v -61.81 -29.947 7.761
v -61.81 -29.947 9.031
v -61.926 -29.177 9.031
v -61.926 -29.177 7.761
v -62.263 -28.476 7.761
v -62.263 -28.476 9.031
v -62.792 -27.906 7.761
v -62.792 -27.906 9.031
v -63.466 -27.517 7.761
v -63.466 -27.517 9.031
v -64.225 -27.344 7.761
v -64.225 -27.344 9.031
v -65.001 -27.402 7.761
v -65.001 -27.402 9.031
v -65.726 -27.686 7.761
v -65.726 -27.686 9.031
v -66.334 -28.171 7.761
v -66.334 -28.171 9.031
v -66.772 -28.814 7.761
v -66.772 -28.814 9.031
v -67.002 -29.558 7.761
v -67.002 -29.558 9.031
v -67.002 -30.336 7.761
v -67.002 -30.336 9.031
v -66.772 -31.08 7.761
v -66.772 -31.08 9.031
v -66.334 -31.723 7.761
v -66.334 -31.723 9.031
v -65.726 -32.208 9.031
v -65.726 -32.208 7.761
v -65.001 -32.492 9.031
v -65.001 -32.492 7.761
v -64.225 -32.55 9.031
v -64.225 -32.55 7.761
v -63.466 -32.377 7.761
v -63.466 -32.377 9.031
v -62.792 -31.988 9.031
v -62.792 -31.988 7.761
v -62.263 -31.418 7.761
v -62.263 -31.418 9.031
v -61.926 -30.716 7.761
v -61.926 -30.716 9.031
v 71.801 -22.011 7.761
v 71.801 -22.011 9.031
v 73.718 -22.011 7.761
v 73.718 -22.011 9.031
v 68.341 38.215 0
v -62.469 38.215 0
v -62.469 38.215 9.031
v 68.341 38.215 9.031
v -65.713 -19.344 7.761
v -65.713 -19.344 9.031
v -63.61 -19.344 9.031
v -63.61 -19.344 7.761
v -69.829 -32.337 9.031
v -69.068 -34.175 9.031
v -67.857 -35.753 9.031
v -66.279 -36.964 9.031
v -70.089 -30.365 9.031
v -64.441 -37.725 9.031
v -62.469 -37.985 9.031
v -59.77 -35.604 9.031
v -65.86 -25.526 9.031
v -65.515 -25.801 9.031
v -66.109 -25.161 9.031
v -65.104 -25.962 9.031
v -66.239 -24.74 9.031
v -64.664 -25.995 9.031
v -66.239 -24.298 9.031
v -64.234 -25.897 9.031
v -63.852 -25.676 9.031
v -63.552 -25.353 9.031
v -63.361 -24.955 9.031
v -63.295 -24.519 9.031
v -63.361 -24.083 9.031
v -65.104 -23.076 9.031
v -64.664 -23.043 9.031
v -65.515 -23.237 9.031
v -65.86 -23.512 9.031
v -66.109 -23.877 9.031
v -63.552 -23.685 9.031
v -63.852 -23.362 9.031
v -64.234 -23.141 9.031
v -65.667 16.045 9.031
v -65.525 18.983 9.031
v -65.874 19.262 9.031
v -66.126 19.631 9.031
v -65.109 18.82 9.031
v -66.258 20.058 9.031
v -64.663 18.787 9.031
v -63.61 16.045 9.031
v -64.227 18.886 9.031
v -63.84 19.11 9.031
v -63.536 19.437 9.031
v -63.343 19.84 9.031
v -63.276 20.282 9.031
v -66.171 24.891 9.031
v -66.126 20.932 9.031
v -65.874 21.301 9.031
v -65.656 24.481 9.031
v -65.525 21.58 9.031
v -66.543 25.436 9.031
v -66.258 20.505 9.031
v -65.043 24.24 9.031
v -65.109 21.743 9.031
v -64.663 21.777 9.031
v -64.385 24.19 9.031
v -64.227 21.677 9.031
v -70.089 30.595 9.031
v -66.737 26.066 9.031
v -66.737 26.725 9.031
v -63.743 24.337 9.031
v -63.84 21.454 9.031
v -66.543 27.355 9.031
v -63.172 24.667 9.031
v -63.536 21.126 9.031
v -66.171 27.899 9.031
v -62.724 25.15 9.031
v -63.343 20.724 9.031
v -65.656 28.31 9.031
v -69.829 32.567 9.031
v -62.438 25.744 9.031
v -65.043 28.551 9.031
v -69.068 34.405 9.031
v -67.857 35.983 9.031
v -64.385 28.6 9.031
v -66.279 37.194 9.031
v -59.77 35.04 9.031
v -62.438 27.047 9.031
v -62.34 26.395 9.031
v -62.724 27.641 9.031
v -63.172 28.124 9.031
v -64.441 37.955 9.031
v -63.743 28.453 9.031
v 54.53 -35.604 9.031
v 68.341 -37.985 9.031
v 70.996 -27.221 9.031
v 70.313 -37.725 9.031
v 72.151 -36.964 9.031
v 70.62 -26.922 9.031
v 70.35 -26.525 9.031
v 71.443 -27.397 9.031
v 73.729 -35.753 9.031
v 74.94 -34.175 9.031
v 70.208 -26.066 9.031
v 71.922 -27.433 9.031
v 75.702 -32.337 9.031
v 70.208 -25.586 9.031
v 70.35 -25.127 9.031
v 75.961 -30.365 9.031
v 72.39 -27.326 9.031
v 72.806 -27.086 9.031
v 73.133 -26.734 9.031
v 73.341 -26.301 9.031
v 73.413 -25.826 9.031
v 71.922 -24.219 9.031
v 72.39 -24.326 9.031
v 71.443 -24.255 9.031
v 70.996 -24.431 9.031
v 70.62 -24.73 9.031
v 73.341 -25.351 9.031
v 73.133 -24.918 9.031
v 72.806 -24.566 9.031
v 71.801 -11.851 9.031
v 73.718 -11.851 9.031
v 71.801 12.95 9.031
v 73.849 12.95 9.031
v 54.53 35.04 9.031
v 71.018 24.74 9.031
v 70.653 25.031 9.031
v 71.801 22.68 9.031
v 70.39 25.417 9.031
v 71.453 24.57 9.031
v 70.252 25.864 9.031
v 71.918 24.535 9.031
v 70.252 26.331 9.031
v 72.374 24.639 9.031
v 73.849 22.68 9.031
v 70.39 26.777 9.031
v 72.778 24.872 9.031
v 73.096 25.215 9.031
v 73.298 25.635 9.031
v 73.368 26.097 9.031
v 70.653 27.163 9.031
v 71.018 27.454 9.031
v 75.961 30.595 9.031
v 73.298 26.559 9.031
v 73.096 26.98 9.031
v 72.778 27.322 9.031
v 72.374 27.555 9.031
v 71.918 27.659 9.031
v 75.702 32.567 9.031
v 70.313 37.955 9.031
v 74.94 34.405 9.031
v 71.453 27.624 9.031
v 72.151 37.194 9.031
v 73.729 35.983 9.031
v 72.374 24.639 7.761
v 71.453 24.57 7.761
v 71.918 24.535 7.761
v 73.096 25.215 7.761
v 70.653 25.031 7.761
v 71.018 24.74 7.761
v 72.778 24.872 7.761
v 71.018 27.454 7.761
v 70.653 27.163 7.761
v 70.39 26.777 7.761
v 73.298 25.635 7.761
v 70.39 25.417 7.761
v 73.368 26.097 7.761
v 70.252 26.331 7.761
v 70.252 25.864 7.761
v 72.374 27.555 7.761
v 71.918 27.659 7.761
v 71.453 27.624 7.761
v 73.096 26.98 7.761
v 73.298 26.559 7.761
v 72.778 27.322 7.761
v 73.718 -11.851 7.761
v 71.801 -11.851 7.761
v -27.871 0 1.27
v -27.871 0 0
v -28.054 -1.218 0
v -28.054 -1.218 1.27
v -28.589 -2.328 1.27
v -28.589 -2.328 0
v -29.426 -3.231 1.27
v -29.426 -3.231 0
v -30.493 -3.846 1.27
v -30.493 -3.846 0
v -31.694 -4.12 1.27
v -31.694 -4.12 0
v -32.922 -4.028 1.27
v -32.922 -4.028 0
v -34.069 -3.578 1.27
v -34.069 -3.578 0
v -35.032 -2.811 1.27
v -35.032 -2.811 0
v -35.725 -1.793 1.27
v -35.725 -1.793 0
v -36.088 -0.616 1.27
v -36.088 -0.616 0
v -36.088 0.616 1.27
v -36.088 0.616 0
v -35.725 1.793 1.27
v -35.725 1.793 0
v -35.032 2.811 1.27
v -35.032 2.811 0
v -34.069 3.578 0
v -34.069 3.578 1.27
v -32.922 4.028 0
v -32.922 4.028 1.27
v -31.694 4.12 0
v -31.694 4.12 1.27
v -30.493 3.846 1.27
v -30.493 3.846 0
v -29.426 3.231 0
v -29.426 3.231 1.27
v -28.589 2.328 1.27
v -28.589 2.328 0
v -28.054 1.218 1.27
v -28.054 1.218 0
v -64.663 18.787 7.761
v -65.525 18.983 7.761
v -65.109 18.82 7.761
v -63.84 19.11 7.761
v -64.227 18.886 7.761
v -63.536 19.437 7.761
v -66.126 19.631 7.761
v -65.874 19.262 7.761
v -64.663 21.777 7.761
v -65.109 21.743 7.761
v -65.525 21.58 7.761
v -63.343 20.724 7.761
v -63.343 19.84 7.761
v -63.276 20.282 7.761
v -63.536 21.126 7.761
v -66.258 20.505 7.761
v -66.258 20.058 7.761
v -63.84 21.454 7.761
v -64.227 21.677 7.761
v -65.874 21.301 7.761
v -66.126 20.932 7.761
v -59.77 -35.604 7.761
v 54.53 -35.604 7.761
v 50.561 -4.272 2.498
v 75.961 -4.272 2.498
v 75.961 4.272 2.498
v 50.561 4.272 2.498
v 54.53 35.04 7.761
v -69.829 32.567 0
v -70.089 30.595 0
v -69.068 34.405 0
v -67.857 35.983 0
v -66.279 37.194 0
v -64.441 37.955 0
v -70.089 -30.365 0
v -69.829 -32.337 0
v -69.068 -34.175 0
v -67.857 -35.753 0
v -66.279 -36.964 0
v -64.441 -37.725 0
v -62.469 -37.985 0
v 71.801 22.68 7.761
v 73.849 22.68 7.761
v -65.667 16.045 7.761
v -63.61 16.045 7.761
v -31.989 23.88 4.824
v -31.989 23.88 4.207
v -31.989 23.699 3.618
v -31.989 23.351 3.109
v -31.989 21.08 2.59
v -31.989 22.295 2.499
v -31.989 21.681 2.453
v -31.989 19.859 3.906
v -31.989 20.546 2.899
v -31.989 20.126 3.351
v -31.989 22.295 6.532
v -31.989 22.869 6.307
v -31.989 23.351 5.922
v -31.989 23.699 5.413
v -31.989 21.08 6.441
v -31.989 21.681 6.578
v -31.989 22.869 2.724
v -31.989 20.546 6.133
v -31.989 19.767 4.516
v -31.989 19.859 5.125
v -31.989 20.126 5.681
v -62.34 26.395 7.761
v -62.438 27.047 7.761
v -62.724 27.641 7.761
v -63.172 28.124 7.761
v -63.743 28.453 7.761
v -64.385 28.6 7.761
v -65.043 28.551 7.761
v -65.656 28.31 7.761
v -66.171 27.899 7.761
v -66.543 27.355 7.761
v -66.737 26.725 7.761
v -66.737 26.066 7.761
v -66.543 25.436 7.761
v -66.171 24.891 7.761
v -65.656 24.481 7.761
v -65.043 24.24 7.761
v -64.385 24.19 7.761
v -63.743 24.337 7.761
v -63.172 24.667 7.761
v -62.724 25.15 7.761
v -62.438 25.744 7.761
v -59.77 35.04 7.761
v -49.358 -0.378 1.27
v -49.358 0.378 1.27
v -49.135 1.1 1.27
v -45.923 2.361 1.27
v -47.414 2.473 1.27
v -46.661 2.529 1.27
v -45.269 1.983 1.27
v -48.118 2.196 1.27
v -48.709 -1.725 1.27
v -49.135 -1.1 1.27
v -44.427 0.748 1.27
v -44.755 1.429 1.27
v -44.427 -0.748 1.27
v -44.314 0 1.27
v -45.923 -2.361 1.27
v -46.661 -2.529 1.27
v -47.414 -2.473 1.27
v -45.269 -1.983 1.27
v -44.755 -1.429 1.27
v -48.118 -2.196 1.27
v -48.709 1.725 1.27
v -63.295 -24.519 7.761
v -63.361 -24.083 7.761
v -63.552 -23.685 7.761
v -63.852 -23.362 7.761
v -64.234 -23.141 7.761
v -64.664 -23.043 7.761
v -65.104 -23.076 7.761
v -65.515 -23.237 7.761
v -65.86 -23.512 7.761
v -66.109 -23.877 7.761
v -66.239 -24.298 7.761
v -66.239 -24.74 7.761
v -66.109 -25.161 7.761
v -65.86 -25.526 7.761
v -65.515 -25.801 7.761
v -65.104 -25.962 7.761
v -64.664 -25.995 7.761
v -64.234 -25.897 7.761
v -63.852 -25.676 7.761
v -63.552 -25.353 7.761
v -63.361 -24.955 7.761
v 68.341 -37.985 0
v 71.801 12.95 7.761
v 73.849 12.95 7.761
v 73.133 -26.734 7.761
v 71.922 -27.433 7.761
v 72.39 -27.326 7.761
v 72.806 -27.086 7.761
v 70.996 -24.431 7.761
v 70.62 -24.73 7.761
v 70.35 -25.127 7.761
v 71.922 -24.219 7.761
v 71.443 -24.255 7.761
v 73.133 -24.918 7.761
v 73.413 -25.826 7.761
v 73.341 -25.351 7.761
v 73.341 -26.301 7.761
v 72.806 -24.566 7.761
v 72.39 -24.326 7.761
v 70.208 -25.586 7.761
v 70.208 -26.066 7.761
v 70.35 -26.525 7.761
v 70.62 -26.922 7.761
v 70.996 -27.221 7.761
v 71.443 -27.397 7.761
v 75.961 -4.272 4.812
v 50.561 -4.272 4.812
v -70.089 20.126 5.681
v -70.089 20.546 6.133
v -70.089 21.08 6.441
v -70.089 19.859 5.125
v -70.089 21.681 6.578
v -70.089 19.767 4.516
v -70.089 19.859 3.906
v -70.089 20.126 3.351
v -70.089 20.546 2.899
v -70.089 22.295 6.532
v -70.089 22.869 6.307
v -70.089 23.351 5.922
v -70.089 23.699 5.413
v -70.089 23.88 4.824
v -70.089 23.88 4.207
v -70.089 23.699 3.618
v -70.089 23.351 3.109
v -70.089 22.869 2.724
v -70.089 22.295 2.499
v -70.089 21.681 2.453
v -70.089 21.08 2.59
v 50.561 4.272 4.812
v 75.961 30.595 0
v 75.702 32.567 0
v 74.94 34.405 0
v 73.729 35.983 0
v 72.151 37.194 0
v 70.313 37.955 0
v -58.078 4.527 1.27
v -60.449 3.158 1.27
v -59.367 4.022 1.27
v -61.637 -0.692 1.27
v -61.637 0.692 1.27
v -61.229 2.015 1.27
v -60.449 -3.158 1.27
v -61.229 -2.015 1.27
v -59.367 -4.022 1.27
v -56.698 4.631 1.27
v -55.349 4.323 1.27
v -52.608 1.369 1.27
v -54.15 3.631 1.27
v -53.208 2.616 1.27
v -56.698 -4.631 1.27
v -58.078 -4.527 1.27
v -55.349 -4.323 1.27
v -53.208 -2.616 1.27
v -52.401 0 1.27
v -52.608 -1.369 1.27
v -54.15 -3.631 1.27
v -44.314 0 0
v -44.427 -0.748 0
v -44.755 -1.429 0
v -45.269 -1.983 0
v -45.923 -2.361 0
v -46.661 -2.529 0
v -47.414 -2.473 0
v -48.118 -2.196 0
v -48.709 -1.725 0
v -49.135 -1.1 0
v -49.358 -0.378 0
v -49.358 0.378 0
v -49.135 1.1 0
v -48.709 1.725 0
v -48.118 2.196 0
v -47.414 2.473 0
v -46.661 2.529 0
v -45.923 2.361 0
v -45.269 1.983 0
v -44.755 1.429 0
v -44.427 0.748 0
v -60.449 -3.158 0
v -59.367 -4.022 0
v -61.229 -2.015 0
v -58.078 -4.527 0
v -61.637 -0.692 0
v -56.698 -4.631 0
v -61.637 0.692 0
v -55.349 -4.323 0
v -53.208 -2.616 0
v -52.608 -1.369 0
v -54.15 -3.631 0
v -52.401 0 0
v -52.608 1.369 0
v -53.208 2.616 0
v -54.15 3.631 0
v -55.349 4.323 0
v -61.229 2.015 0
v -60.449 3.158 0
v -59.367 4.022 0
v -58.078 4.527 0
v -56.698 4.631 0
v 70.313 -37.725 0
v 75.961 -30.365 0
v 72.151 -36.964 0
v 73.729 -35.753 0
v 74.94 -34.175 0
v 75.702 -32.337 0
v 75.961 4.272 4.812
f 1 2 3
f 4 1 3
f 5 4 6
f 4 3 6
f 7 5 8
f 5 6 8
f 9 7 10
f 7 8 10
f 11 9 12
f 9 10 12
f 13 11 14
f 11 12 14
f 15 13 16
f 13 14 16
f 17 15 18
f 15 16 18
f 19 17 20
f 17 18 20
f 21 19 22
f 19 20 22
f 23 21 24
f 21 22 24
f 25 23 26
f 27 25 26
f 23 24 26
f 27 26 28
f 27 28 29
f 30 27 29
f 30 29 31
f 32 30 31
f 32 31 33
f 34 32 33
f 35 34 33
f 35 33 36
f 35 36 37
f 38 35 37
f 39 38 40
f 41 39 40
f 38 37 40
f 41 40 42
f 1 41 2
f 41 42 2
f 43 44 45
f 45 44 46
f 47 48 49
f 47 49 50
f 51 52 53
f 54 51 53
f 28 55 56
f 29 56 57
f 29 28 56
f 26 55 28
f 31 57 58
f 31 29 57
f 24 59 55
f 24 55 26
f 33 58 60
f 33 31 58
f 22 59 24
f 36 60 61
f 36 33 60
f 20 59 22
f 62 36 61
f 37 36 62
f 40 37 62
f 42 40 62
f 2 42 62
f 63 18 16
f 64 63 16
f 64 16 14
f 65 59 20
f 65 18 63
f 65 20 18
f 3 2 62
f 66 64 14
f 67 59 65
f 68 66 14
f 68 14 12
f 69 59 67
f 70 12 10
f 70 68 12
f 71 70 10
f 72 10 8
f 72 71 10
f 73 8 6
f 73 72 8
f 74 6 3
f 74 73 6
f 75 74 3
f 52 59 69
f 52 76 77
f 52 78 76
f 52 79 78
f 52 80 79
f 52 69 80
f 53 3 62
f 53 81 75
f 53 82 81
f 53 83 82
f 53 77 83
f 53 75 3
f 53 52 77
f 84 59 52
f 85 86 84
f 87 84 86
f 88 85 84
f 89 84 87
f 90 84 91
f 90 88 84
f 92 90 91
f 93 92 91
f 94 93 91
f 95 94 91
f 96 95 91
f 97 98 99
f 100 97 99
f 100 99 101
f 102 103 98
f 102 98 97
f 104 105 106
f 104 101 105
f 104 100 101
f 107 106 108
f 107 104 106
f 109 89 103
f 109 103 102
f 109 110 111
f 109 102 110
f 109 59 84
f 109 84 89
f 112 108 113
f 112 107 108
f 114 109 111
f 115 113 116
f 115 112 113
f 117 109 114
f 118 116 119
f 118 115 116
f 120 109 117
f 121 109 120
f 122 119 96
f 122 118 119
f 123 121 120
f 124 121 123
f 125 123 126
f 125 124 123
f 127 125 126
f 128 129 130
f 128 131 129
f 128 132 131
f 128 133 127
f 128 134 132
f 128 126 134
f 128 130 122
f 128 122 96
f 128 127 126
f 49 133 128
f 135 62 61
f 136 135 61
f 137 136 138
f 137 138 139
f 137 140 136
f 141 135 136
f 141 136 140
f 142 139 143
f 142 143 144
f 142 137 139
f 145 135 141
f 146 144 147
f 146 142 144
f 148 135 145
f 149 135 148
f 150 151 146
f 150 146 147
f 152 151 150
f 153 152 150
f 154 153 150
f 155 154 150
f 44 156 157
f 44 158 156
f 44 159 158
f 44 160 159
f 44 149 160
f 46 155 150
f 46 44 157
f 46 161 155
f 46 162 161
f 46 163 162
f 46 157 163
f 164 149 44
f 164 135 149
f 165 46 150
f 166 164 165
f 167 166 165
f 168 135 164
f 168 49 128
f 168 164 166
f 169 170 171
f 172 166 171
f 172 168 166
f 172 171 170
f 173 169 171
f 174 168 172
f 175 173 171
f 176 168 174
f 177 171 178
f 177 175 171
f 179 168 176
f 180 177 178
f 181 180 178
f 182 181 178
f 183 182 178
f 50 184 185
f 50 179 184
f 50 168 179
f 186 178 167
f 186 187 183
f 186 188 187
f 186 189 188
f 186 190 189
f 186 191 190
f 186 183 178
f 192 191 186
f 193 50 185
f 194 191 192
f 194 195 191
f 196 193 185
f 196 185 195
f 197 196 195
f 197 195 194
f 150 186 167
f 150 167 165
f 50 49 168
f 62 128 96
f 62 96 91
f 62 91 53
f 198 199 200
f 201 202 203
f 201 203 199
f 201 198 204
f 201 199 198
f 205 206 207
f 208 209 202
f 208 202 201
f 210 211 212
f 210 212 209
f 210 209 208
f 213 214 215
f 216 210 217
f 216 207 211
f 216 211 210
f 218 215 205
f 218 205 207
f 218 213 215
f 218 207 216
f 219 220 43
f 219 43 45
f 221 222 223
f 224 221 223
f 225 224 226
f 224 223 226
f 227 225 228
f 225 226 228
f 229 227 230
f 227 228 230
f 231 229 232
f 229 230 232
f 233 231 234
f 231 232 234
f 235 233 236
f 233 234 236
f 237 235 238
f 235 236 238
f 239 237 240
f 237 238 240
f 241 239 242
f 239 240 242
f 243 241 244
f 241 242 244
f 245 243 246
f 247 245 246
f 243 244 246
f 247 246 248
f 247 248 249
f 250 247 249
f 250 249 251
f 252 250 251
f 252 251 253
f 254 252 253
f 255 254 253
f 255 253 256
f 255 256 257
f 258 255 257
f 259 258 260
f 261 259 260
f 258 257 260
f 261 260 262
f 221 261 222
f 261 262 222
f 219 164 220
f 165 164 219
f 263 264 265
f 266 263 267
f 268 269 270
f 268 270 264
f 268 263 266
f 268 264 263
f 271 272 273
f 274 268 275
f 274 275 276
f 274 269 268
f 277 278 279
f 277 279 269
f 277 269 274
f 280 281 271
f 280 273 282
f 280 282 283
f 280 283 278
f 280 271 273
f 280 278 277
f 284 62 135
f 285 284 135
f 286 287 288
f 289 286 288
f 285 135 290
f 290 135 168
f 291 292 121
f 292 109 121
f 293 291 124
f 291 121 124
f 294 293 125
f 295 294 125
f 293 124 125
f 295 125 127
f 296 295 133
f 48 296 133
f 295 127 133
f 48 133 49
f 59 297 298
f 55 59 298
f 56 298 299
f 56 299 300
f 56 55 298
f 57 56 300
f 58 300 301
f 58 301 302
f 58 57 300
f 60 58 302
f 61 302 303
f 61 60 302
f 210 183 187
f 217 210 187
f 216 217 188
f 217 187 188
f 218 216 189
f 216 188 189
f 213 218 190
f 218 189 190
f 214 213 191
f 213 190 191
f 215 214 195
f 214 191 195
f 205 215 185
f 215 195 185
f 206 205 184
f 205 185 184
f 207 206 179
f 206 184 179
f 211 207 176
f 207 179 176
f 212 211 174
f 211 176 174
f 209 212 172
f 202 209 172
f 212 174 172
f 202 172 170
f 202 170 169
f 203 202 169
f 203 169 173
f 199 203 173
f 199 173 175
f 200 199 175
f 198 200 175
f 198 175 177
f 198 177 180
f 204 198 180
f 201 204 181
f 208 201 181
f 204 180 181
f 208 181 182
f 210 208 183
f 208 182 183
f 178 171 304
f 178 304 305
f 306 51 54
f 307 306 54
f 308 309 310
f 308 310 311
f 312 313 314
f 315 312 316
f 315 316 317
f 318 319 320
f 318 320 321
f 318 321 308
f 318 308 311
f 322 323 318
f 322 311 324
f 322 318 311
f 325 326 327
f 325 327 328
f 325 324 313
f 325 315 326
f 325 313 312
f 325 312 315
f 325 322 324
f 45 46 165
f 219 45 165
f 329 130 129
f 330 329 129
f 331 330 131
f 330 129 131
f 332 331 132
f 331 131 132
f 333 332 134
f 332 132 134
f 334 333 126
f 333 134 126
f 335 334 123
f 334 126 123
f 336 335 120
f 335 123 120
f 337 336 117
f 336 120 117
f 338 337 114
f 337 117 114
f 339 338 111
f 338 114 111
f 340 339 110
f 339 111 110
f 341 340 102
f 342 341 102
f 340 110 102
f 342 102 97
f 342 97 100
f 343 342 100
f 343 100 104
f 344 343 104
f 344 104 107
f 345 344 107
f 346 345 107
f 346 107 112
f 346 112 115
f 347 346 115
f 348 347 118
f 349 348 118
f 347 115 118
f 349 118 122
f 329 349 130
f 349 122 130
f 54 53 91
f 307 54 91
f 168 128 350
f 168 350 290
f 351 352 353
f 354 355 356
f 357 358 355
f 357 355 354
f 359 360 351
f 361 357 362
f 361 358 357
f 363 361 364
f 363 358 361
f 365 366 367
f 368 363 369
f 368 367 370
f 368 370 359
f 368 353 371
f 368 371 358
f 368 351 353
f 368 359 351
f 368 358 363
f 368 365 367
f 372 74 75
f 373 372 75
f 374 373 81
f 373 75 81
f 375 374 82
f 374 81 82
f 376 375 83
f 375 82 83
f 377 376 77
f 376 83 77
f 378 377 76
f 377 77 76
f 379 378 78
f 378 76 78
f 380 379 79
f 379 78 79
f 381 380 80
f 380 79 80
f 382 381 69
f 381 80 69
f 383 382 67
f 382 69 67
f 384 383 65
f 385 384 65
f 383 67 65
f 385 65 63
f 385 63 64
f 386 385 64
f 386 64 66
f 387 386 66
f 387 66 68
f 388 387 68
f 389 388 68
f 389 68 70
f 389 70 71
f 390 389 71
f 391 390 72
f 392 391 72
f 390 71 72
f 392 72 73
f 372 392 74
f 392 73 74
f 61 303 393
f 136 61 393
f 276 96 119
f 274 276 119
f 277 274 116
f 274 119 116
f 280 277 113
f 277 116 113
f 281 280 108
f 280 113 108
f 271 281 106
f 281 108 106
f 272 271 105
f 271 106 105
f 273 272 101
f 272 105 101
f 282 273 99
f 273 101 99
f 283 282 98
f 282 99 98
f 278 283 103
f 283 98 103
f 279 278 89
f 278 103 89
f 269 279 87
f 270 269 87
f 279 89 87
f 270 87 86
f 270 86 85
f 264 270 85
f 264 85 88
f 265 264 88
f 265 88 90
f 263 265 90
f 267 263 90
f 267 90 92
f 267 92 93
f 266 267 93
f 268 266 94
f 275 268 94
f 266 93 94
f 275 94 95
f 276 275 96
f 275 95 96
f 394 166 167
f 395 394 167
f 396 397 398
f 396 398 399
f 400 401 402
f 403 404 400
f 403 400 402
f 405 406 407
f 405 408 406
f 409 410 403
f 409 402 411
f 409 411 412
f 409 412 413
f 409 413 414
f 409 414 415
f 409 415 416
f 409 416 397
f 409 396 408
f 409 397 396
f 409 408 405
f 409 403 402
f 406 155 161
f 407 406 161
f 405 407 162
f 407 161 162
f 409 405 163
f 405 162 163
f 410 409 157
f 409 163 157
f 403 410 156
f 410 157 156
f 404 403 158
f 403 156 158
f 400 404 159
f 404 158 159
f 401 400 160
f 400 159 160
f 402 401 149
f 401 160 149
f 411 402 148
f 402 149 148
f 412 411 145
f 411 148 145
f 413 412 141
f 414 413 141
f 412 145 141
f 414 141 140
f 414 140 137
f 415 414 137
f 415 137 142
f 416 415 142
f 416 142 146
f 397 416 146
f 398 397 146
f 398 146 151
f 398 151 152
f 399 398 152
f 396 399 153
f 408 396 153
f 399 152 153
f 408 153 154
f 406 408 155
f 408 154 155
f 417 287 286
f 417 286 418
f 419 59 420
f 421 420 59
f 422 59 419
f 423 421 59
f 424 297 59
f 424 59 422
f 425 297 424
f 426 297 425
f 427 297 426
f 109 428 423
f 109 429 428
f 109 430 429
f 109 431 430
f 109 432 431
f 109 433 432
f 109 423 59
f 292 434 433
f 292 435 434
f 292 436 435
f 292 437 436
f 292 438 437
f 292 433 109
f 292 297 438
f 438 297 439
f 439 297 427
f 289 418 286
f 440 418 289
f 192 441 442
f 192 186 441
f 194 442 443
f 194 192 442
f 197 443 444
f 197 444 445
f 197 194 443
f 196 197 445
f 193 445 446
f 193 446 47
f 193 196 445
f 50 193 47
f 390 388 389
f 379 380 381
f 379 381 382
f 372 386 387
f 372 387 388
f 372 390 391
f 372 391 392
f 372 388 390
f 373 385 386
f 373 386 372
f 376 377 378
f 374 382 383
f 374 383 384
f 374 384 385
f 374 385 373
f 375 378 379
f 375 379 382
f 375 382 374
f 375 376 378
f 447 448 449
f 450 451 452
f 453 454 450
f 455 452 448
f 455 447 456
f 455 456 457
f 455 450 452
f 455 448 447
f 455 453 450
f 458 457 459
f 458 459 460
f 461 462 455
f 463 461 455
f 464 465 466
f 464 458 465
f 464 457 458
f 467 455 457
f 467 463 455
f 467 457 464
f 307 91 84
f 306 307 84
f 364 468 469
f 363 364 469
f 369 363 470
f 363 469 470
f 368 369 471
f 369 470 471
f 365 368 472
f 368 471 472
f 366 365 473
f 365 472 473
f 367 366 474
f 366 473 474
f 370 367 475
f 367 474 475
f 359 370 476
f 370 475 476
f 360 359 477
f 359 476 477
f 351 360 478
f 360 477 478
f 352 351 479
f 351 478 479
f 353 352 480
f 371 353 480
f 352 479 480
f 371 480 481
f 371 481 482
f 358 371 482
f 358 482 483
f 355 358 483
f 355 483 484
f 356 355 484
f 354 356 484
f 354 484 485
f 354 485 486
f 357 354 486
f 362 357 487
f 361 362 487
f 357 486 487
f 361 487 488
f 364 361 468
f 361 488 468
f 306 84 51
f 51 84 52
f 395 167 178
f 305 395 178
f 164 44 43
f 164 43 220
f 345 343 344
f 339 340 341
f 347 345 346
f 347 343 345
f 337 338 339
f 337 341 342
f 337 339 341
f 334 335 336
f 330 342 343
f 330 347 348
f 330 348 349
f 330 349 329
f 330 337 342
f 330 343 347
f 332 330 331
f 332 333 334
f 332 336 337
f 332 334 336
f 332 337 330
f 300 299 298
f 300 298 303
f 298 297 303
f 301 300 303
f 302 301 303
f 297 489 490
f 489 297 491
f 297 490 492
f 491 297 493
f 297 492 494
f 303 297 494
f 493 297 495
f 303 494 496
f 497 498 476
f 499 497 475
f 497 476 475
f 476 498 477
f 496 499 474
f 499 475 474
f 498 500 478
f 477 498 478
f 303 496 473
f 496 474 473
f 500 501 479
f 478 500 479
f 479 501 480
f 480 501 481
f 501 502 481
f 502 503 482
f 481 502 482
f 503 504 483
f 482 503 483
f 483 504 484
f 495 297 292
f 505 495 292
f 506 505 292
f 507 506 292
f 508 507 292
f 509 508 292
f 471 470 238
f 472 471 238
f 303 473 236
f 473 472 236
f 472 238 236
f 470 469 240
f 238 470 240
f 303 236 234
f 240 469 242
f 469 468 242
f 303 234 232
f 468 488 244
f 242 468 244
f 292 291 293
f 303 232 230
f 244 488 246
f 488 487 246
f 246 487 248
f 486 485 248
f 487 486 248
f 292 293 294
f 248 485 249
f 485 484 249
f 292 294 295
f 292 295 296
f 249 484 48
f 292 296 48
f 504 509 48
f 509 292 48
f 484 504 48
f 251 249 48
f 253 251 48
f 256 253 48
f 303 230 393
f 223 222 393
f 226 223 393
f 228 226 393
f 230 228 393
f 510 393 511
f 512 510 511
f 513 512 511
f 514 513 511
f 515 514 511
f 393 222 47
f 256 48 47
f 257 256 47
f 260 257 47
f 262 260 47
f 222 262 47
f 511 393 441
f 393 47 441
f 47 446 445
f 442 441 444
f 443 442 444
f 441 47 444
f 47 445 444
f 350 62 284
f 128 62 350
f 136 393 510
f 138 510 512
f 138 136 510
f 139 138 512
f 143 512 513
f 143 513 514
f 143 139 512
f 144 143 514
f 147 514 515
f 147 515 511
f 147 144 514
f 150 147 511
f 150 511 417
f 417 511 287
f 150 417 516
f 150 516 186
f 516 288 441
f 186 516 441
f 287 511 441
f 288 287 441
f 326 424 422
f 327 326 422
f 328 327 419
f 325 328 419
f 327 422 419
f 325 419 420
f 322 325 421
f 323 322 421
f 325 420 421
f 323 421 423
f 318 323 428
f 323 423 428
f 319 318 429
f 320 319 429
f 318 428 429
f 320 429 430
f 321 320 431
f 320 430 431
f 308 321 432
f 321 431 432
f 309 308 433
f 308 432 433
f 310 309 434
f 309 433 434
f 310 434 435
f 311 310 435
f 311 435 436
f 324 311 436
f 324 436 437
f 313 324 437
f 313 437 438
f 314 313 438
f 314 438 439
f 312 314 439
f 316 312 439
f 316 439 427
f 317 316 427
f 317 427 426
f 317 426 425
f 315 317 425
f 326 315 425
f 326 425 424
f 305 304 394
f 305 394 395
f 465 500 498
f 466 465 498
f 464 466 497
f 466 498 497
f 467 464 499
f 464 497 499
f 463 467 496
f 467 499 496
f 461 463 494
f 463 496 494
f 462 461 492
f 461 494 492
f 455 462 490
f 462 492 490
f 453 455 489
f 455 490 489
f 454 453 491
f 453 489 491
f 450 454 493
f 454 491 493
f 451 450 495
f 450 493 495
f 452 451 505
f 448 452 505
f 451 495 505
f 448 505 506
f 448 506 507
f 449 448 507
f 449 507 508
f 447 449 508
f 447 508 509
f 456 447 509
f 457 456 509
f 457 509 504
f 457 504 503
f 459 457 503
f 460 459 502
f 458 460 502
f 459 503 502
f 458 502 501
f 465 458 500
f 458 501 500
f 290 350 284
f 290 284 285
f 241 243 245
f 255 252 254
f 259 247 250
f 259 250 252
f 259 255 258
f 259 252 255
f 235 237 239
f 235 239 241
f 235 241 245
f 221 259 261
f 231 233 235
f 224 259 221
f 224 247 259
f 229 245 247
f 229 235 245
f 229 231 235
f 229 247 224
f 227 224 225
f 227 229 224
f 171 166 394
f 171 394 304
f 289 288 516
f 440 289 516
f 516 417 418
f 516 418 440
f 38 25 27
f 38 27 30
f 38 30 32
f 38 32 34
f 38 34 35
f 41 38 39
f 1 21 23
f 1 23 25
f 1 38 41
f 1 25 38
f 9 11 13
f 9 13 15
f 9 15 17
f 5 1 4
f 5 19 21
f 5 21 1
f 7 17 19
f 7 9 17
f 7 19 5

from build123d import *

# Parameters (mm, degrees)
F0_W      = 146.05
F0_H      = 76.2
F1_DEPTH  = 9.031111
F2_R      = 7.62
F3_W      = 8.543316
F3_H      = 2.313646
F4_DEPTH  = 25.4
F5_R      = 2.068187
F6_DEPTH  = 2.54
F7_DEPTH  = 38.1
F8_W      = 114.3
F8_H      = 70.64375
F9_DEPTH  = 1.27
F10_R     = 2.211011
F10_R_2   = 1.499171
F10_R_3   = 1.566639
F10_R_4   = 1.611216
F10_R_5   = 2.610704
F10_R_6   = 1.480203
F10_W     = 2.047286
F10_H     = 9.729784
F10_W_2   = 1.917139
F10_H_2   = 10.160214
F11_DEPTH = 1.27
F12_R     = 4.643642
F12_R_2   = 2.536257
F12_R_3   = 4.132051
F13_DEPTH = 1.27


with BuildPart() as f1:
    # F0 (on Top) → F1 (new body)
    with BuildSketch(Plane.XY):
        with Locations((2.936147, 0.115003)):
            Rectangle(F0_W, F0_H)
    extrude(amount=F1_DEPTH)

    # F2
    f2_edges = [f1.edges().sort_by_distance(p)[0] for p in [
        (75.961147, -37.984997, 4.515556),
        (-70.088853, -37.984997, 4.515556),
        (-70.088853, 38.215003, 4.515556),
        (75.961147, 38.215003, 4.515556),
    ]]
    fillet(f2_edges, radius=F2_R)

    # F3 (on face) → F4 (cut)
    with BuildSketch(Plane.YZ.offset(75.961147)):
        with Locations((0, 3.654829)):
            Rectangle(F3_W, F3_H)
    extrude(amount=-F4_DEPTH, mode=Mode.SUBTRACT)

    # F5 (on face) → F6 (cut)
    with BuildSketch(Plane(origin=(-70.088853, 0, 0), x_dir=(0, -1, 0), z_dir=(-1, 0, 0))):
        with Locations((-21.835269, 4.515556)):
            Circle(F5_R)
    extrude(amount=-F6_DEPTH, mode=Mode.SUBTRACT)

    # F5 (on face) → F7 (cut)
    with BuildSketch(Plane(origin=(-70.088853, 0, 0), x_dir=(0, -1, 0), z_dir=(-1, 0, 0))):
        with Locations((-21.835269, 4.515556)):
            Circle(F5_R)
    extrude(amount=-F7_DEPTH, mode=Mode.SUBTRACT)

    # F8 (on face) → F9 (cut)
    with BuildSketch(Plane.XY.offset(9.031111)):
        with Locations((-2.620103, -0.281872)):
            Rectangle(F8_W, F8_H)
    extrude(amount=-F9_DEPTH, mode=Mode.SUBTRACT)

    # F10 (on face) → F11 (cut)
    with BuildSketch(Plane.XY.offset(9.031111)):
        with Locations((-64.550646, 26.395293)):
            Circle(F10_R)
        with Locations((-64.775102, 20.281654)):
            Circle(F10_R_2)
        with Locations((71.801327, 26.097044)):
            Circle(F10_R_3)
        with Locations((71.801327, -25.825897)):
            Circle(F10_R_4)
        with Locations((-64.420246, -29.946957)):
            Circle(F10_R_5)
        with Locations((-64.775102, -24.518941)):
            Circle(F10_R_6)
        Polygon((-63.610494, 16.045377), (-65.666994, 16.045377), (-65.712694, -19.34428), (-63.610494, -19.34428), align=None)
        with Locations((72.82497, 17.815223)):
            Rectangle(F10_W, F10_H)
        with Locations((72.759896, -16.931376)):
            Rectangle(F10_W_2, F10_H_2)
    extrude(amount=-F11_DEPTH, mode=Mode.SUBTRACT)

    # F12 (on face) → F13 (cut)
    with BuildSketch(Plane(origin=(0, 0, 0), x_dir=(1, 0, 0), z_dir=(0, 0, -1))):
        with Locations((-57.045136, 0)):
            Circle(F12_R)
        with Locations((-46.850082, 0)):
            Circle(F12_R_2)
        with Locations((-32.002568, 0)):
            Circle(F12_R_3)
    extrude(amount=-F13_DEPTH, mode=Mode.SUBTRACT)


solid = f1.part
